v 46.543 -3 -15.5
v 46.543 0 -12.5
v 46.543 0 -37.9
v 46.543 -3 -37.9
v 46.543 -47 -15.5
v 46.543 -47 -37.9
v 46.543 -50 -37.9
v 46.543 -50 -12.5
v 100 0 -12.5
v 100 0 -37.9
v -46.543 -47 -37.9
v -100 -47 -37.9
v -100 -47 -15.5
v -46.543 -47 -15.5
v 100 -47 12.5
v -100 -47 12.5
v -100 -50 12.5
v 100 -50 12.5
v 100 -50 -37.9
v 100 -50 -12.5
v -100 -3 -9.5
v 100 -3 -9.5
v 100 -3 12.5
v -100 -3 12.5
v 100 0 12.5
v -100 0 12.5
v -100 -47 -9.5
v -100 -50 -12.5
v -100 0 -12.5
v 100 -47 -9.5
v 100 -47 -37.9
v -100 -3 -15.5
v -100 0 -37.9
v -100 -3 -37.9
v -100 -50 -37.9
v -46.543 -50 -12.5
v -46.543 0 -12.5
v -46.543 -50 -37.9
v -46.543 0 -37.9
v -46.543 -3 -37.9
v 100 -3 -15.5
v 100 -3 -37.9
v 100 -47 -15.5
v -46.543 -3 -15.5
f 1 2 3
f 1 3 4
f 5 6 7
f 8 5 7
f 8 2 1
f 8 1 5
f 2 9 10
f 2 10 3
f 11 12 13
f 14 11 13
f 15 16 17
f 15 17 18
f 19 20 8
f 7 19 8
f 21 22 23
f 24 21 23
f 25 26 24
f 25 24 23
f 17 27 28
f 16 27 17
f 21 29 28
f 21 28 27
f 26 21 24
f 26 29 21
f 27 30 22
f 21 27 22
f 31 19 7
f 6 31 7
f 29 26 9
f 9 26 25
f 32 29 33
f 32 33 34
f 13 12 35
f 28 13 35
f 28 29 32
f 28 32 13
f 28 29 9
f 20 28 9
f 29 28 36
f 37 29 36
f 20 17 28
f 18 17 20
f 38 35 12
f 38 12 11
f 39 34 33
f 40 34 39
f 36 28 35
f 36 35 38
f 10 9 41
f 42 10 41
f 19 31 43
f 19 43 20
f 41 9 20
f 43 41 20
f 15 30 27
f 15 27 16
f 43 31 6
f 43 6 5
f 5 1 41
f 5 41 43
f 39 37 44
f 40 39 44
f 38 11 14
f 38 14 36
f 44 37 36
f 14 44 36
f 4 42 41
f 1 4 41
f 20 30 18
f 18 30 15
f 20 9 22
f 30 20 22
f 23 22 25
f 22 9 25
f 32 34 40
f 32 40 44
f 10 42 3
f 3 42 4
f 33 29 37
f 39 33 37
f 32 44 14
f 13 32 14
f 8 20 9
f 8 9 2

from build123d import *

# Parameters (mm, degrees)
F0_W     = 200
F0_H     = 25
F1_DEPTH = 50
F2_W     = 44
F2_H     = 22
F3_DEPTH = 200.001
F4_W     = 53.4567855299
F4_H     = 50
F5_DEPTH = 25.4
F6_W     = 44
F6_H     = 22.4
F7_DEPTH = 200.001


# Not quite as in the source:
# - a feature names something its author has since deleted; it is built from what else it names


with BuildPart() as f1:
    # F0 (on Front) → F1 (new body)
    with BuildSketch(Plane.XZ):
        Rectangle(F0_W, F0_H)
    extrude(amount=F1_DEPTH)

    # F2 (on face) → F3 (cut, through all)
    with BuildSketch(Plane.YZ.offset(100)):
        with Locations((-25, 1.5)):
            Rectangle(F2_W, F2_H)
    extrude(amount=-F3_DEPTH, mode=Mode.SUBTRACT)


with BuildPart() as f5:
    # F4 (on face) → F5 (new body)
    with BuildSketch(Plane(origin=(0, 0, -12.5), x_dir=(1, 0, 0), z_dir=(0, 0, -1))):
        with Locations((-73.2716072351, 25)):
            Rectangle(F4_W, F4_H)
    extrude(amount=F5_DEPTH)

    # F6 (on face) → F7 (cut, through all)
    with BuildSketch(Plane(origin=(-100, 0, 0), x_dir=(0, -1, 0), z_dir=(-1, 0, 0))):
        with Locations((25, -26.7)):
            Rectangle(F6_W, F6_H)
    extrude(amount=-F7_DEPTH, mode=Mode.SUBTRACT)


with BuildPart() as f8_1:
    # F8: instance of F5
    add(f5.part.mirror(Plane.YZ))


solid = Compound([f1.part, f5.part, f8_1.part])
